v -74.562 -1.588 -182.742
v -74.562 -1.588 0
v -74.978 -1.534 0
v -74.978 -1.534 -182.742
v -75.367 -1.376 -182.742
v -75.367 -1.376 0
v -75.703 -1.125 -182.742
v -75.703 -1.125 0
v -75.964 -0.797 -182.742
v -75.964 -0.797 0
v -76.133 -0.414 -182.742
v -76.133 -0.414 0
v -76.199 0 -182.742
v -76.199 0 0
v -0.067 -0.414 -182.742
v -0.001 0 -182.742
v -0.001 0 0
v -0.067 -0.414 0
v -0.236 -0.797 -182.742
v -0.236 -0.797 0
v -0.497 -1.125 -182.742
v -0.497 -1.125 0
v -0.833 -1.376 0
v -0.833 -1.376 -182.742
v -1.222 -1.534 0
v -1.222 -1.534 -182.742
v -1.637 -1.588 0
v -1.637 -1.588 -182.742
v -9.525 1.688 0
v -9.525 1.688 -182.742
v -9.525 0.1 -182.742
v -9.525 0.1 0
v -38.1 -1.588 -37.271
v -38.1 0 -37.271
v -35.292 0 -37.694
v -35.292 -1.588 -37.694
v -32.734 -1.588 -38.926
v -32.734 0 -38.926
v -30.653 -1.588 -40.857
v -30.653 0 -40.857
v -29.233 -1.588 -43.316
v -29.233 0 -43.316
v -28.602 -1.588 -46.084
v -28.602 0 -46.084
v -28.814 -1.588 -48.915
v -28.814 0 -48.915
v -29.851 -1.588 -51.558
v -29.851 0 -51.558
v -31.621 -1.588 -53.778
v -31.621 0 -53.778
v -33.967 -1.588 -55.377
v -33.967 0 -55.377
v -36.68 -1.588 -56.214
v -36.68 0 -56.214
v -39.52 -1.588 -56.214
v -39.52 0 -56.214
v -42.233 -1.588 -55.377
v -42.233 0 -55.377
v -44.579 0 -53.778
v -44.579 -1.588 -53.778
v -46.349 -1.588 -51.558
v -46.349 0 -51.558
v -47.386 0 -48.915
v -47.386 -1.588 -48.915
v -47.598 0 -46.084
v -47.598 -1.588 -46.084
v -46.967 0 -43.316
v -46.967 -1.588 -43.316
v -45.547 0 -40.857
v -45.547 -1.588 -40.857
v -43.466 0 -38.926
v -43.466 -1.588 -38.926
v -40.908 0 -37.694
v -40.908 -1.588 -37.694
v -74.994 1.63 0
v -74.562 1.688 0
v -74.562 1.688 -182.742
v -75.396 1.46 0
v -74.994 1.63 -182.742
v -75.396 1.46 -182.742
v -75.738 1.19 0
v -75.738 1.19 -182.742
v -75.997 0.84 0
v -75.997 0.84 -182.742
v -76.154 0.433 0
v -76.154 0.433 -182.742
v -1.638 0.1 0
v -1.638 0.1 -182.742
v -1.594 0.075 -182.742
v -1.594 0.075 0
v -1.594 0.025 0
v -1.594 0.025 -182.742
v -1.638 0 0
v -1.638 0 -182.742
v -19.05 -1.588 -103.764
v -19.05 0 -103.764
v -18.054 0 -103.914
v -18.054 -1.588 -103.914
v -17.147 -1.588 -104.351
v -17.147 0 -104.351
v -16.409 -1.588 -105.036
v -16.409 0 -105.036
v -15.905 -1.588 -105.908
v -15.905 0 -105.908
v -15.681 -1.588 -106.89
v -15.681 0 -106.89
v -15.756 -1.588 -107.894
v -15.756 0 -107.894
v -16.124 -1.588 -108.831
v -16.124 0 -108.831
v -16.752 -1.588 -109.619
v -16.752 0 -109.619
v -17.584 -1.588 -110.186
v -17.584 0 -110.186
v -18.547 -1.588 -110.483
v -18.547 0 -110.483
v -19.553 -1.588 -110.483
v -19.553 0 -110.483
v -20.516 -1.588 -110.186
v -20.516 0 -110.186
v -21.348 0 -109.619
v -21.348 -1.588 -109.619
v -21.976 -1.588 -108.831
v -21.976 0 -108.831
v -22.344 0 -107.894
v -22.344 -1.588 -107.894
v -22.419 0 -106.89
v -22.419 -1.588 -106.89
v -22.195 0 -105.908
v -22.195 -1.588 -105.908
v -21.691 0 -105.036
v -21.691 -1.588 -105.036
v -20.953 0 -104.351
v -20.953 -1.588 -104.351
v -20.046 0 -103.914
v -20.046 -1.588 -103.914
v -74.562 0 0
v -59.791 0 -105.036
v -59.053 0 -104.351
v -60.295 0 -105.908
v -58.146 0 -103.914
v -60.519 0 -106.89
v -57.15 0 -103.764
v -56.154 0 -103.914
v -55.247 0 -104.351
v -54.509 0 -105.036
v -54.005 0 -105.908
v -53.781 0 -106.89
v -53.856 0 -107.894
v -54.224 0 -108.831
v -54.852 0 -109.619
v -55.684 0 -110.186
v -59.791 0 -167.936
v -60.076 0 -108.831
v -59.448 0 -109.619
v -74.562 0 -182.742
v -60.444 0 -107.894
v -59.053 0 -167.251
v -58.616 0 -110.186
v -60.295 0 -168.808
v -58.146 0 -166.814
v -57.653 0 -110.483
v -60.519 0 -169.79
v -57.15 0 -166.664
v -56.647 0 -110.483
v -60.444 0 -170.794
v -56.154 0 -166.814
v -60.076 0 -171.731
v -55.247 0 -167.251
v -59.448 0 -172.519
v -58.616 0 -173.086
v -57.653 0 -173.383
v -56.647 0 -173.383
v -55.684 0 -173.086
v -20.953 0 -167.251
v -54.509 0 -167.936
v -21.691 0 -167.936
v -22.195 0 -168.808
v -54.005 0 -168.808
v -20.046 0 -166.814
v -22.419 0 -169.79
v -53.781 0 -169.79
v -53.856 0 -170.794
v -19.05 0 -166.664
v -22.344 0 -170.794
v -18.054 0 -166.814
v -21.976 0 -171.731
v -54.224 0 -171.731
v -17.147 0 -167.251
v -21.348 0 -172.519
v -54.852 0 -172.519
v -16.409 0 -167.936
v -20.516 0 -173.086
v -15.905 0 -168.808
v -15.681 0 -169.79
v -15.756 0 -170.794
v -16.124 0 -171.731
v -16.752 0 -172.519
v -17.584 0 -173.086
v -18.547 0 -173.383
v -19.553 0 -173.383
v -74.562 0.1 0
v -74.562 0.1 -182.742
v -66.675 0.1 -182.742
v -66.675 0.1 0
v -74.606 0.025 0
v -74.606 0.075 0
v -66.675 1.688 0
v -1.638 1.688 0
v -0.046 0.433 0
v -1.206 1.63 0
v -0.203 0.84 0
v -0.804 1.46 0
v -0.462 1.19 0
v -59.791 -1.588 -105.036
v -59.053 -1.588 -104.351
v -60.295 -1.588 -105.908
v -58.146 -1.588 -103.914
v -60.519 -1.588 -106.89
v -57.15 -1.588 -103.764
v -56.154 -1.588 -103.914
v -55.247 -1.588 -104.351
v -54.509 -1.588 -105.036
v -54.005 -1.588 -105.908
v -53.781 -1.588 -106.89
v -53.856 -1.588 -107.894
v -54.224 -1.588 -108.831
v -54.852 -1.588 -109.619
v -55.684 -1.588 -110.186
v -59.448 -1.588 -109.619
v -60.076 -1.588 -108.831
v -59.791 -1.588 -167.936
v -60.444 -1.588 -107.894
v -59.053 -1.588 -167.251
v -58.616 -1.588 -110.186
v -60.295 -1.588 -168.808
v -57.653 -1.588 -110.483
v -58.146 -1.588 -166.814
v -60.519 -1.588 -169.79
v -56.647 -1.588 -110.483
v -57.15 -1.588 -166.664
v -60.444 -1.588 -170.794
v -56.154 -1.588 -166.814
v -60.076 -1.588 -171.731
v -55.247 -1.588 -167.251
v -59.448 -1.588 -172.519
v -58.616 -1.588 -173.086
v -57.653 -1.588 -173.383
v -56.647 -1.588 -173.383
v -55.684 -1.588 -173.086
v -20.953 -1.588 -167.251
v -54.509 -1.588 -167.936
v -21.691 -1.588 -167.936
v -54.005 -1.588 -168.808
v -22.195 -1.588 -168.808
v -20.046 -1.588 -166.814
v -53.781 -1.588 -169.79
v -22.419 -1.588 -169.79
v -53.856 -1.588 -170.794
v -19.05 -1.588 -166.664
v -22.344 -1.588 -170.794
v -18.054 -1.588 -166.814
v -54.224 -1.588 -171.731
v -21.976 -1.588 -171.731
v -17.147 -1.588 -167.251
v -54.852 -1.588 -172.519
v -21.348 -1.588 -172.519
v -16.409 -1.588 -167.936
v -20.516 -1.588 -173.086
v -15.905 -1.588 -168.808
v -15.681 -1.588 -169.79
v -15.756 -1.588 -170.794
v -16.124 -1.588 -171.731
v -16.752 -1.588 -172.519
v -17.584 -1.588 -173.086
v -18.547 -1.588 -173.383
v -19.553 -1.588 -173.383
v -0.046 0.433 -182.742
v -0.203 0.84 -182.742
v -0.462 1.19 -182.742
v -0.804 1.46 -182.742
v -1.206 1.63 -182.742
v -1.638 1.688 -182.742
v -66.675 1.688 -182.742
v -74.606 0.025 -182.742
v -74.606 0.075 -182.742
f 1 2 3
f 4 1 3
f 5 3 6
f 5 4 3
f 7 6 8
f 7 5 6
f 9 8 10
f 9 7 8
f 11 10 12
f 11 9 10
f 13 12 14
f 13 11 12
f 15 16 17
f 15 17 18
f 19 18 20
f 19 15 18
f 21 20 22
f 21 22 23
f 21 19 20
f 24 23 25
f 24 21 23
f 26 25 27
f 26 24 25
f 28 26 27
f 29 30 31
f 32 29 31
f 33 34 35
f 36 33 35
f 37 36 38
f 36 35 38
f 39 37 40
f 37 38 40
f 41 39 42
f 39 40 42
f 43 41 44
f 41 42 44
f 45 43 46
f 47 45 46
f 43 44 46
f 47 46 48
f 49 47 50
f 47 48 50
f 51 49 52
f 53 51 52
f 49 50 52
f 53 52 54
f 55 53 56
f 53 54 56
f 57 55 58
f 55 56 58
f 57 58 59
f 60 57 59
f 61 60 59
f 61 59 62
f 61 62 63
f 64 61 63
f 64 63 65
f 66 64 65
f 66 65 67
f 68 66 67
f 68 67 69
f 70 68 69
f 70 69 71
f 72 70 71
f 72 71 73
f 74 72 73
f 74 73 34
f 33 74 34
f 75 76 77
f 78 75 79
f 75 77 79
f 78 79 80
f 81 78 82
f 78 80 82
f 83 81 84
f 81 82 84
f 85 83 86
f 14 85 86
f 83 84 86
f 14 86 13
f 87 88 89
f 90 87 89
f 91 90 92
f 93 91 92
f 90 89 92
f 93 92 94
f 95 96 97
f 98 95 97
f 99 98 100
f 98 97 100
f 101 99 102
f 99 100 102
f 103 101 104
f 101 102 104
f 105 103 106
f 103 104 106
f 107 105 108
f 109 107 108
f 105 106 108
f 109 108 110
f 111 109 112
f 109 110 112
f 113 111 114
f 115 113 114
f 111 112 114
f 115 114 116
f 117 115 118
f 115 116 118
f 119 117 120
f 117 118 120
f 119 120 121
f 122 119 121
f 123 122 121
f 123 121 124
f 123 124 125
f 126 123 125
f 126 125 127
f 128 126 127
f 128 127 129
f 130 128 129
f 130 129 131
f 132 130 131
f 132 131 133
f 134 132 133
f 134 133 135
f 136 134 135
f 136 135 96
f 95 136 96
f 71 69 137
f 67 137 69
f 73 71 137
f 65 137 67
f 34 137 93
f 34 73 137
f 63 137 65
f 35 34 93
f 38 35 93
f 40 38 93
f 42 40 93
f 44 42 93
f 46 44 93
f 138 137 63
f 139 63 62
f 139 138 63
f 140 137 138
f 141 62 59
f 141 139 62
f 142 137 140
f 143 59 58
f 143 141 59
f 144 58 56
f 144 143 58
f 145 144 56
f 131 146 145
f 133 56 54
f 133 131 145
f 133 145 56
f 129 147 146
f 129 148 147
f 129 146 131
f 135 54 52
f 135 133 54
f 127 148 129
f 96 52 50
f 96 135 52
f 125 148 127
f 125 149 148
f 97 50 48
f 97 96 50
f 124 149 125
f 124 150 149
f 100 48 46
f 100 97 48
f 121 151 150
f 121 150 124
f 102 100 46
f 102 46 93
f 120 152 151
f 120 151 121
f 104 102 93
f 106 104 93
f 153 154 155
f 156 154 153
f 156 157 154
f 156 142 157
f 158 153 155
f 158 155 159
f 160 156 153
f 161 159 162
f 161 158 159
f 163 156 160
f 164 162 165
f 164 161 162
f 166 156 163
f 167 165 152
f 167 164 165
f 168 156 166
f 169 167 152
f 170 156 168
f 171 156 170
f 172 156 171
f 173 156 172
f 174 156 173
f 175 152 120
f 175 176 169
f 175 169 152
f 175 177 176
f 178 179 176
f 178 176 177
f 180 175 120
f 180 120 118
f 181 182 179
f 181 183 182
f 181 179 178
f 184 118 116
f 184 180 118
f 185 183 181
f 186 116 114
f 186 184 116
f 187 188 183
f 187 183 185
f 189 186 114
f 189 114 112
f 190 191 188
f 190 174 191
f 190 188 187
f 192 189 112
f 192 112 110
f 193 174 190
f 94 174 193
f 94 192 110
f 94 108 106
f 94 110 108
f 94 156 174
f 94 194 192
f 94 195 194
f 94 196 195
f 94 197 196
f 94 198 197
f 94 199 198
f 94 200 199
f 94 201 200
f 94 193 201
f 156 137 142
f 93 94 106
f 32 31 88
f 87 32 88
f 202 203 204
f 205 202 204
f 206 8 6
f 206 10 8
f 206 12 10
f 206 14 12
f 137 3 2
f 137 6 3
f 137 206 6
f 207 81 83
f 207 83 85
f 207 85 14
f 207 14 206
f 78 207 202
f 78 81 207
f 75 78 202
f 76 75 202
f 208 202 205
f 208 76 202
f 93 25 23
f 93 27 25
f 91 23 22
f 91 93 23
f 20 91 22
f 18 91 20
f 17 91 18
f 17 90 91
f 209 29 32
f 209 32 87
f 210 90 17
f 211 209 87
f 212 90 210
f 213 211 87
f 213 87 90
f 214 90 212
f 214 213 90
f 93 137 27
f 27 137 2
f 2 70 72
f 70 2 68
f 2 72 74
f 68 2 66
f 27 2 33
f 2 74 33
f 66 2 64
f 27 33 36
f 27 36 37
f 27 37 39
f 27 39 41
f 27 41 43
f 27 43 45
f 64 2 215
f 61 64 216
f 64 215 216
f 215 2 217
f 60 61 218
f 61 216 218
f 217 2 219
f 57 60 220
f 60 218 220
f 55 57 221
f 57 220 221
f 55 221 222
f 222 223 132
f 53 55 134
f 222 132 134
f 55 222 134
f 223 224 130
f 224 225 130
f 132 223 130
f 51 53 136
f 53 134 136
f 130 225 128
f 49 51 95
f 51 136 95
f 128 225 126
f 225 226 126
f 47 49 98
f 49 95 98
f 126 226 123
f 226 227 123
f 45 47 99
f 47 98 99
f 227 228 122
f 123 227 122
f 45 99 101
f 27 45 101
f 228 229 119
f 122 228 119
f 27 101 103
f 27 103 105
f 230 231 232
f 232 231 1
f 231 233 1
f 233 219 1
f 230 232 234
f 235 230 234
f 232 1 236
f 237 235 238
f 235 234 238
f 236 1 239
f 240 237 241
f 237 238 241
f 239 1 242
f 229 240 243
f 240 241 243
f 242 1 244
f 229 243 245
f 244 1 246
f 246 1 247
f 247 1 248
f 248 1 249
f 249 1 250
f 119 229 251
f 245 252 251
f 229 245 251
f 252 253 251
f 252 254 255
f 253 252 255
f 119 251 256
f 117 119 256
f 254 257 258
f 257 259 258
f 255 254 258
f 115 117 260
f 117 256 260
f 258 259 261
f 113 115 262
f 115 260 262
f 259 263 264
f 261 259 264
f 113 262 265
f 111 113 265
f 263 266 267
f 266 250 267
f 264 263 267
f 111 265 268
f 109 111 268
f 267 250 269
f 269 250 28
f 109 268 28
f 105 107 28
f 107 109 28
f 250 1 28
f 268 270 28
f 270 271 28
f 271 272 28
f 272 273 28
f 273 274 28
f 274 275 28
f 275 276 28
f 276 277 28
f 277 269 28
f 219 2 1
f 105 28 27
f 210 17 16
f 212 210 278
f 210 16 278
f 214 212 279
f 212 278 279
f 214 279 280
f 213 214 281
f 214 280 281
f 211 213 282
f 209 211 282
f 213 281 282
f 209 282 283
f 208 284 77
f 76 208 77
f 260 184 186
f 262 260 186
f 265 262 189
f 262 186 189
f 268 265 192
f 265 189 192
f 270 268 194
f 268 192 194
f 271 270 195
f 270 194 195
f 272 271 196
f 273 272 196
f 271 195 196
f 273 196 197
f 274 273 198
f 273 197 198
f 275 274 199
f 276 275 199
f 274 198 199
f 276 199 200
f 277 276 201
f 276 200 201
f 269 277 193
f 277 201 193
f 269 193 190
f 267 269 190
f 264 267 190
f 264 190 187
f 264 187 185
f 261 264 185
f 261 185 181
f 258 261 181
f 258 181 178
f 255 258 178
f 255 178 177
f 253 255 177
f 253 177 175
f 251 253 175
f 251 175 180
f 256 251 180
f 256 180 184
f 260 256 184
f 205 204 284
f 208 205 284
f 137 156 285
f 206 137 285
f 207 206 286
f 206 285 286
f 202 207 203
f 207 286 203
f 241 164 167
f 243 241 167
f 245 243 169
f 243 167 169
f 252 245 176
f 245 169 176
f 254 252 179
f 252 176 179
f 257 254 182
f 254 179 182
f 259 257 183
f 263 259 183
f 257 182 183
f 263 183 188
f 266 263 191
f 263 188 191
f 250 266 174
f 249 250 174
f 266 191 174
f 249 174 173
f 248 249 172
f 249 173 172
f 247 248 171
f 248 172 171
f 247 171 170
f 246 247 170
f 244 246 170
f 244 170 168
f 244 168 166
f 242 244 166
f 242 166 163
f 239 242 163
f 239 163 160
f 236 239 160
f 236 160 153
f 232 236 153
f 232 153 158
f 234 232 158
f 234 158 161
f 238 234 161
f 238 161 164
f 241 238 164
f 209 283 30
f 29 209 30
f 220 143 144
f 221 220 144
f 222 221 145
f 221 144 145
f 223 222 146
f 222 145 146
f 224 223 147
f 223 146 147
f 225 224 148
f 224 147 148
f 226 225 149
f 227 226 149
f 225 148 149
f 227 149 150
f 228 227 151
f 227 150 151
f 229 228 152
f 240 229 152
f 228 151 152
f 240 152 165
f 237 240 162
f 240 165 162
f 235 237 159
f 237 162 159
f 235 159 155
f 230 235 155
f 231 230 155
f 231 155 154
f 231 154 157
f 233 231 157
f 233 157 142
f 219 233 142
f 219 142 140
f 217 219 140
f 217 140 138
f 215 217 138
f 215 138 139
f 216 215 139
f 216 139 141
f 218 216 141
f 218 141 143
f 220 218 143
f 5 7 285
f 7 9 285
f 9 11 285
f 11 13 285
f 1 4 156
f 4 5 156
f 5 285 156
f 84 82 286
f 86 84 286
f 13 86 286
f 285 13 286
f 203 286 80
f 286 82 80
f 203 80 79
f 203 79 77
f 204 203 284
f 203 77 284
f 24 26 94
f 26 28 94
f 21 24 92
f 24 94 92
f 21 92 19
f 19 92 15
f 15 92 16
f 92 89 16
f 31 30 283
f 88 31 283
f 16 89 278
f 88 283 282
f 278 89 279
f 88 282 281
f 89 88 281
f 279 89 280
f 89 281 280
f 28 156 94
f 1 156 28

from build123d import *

# Parameters (mm, degrees)
SKETCH1_W          = 76.2
SKETCH1_H          = 182.7422304
BASE_FLANGE1_DEPTH = 1.5875
CUT_EXTRUDE1_REACH = 199.999
SKETCH6_R          = 3.3782
SKETCH7_R          = 9.525
CUT_EXTRUDE2_DEPTH = 198.999199311
HEM1_START         = -182.7422304
HEM1_DEPTH         = 182.7422304
HEM1_2_DEPTH       = 182.7422304


# Read off the part's stored shape, not the designer's step: Hem1
# Sheet-metal steps are written as plain solids
with BuildPart() as part:
    # Sketch1 → Base-Flange1 (new body)
    with BuildSketch(Plane(origin=(0, 0, 0), x_dir=(1, 0, 0), z_dir=(0, 1, 0))):
        with Locations((-38.1, 91.3711152)):
            Rectangle(SKETCH1_W, SKETCH1_H)
    extrude(amount=-BASE_FLANGE1_DEPTH)

    # Sketch6 → Cut-Extrude1 (cut, up to next)
    with BuildSketch(Plane(origin=(0, 0, 0), x_dir=(1, 0, 0), z_dir=(0, 1, 0)), mode=Mode.PRIVATE) as cut_extrude1_sk1:
        with Locations(Location((-57.15, 170.0422304, 0), (0, 0, 270))):
            Circle(SKETCH6_R)
    cut_extrude1_tool1 = extrude(cut_extrude1_sk1.sketch, amount=-CUT_EXTRUDE1_REACH, mode=Mode.PRIVATE) & part.part
    # Sketch6 → Cut-Extrude1 (cut, up to next)
    with BuildSketch(Plane(origin=(0, 0, 0), x_dir=(1, 0, 0), z_dir=(0, 1, 0)), mode=Mode.PRIVATE) as cut_extrude1_sk2:
        with Locations(Location((-19.05, 170.0422304, 0), (0, 0, 270))):
            Circle(SKETCH6_R)
    cut_extrude1_tool2 = extrude(cut_extrude1_sk2.sketch, amount=-CUT_EXTRUDE1_REACH, mode=Mode.PRIVATE) & part.part
    # Sketch6 → Cut-Extrude1 (cut, up to next)
    with BuildSketch(Plane(origin=(0, 0, 0), x_dir=(1, 0, 0), z_dir=(0, 1, 0)), mode=Mode.PRIVATE) as cut_extrude1_sk3:
        with Locations(Location((-19.05, 107.14228, 0), (0, 0, 270))):
            Circle(SKETCH6_R)
    cut_extrude1_tool3 = extrude(cut_extrude1_sk3.sketch, amount=-CUT_EXTRUDE1_REACH, mode=Mode.PRIVATE) & part.part
    # Sketch6 → Cut-Extrude1 (cut, up to next)
    with BuildSketch(Plane(origin=(0, 0, 0), x_dir=(1, 0, 0), z_dir=(0, 1, 0)), mode=Mode.PRIVATE) as cut_extrude1_sk4:
        with Locations(Location((-57.15, 107.14228, 0), (0, 0, 270))):
            Circle(SKETCH6_R)
    cut_extrude1_tool4 = extrude(cut_extrude1_sk4.sketch, amount=-CUT_EXTRUDE1_REACH, mode=Mode.PRIVATE) & part.part
    add(cut_extrude1_tool1.solids().sort_by_distance((-57.15, 0, -170.04223))[0], mode=Mode.SUBTRACT)
    add(cut_extrude1_tool2.solids().sort_by_distance((-19.05, 0, -170.04223))[0], mode=Mode.SUBTRACT)
    add(cut_extrude1_tool3.solids().sort_by_distance((-19.05, 0, -107.14228))[0], mode=Mode.SUBTRACT)
    add(cut_extrude1_tool4.solids().sort_by_distance((-57.15, 0, -107.14228))[0], mode=Mode.SUBTRACT)

    # Sketch7 → Cut-Extrude2 (cut, through all)
    with BuildSketch(Plane(origin=(0, 0, 0), x_dir=(1, 0, 0), z_dir=(0, 1, 0))):
        with Locations(Location((-38.1, 46.7957408, 0), (0, 0, 270))):
            Circle(SKETCH7_R)
    extrude(amount=-CUT_EXTRUDE2_DEPTH, mode=Mode.SUBTRACT)

    # Hem1 outline → Hem1 (cut)
    with BuildSketch(Plane.XY.offset(HEM1_START)):
        with BuildLine():
            ThreePointArc((-74.5625, -1.5875), (-75.70257264, -1.125432101), (-76.199236463, 0))
            Line((-76.199236463, 0), (-76.2, 0))
            Line((-76.2, 0), (-76.2, -1.5875))
            Line((-76.2, -1.5875), (-74.5625, -1.5875))
        make_face()
        with BuildLine():
            ThreePointArc((-0.000763537, 0), (-0.49742736, -1.125432101), (-1.6375, -1.5875))
            Line((-1.6375, -1.5875), (0, -1.5875))
            Line((0, -1.5875), (0, 0))
            Line((0, 0), (-0.000763537, 0))
        make_face()
    extrude(amount=HEM1_DEPTH, mode=Mode.SUBTRACT)

    # Hem1 2 outline → Hem1 2 (add)
    with BuildSketch(Plane.XY.offset(HEM1_START)):
        with BuildLine():
            Line((-66.675, 0.1), (-66.675, 1.6875))
            Line((-66.675, 1.6875), (-74.5625, 1.6875))
            ThreePointArc((-74.5625, 1.6875), (-75.737932101, 1.19007264), (-76.199236463, 0))
            Line((-76.199236463, 0), (-74.5625, 0))
            ThreePointArc((-74.5625, 0), (-74.6125, 0.05), (-74.5625, 0.1))
            Line((-74.5625, 0.1), (-66.675, 0.1))
        make_face()
        with BuildLine():
            ThreePointArc((-1.6375, 0.1), (-1.5875, 0.05), (-1.6375, 0))
            Line((-1.6375, 0), (-0.000763537, 0))
            ThreePointArc((-0.000763537, 0), (-0.462067899, 1.19007264), (-1.6375, 1.6875))
            Line((-1.6375, 1.6875), (-9.525, 1.6875))
            Line((-9.525, 1.6875), (-9.525, 0.1))
            Line((-9.525, 0.1), (-1.6375, 0.1))
        make_face()
    extrude(amount=HEM1_2_DEPTH)


solid = part.part
